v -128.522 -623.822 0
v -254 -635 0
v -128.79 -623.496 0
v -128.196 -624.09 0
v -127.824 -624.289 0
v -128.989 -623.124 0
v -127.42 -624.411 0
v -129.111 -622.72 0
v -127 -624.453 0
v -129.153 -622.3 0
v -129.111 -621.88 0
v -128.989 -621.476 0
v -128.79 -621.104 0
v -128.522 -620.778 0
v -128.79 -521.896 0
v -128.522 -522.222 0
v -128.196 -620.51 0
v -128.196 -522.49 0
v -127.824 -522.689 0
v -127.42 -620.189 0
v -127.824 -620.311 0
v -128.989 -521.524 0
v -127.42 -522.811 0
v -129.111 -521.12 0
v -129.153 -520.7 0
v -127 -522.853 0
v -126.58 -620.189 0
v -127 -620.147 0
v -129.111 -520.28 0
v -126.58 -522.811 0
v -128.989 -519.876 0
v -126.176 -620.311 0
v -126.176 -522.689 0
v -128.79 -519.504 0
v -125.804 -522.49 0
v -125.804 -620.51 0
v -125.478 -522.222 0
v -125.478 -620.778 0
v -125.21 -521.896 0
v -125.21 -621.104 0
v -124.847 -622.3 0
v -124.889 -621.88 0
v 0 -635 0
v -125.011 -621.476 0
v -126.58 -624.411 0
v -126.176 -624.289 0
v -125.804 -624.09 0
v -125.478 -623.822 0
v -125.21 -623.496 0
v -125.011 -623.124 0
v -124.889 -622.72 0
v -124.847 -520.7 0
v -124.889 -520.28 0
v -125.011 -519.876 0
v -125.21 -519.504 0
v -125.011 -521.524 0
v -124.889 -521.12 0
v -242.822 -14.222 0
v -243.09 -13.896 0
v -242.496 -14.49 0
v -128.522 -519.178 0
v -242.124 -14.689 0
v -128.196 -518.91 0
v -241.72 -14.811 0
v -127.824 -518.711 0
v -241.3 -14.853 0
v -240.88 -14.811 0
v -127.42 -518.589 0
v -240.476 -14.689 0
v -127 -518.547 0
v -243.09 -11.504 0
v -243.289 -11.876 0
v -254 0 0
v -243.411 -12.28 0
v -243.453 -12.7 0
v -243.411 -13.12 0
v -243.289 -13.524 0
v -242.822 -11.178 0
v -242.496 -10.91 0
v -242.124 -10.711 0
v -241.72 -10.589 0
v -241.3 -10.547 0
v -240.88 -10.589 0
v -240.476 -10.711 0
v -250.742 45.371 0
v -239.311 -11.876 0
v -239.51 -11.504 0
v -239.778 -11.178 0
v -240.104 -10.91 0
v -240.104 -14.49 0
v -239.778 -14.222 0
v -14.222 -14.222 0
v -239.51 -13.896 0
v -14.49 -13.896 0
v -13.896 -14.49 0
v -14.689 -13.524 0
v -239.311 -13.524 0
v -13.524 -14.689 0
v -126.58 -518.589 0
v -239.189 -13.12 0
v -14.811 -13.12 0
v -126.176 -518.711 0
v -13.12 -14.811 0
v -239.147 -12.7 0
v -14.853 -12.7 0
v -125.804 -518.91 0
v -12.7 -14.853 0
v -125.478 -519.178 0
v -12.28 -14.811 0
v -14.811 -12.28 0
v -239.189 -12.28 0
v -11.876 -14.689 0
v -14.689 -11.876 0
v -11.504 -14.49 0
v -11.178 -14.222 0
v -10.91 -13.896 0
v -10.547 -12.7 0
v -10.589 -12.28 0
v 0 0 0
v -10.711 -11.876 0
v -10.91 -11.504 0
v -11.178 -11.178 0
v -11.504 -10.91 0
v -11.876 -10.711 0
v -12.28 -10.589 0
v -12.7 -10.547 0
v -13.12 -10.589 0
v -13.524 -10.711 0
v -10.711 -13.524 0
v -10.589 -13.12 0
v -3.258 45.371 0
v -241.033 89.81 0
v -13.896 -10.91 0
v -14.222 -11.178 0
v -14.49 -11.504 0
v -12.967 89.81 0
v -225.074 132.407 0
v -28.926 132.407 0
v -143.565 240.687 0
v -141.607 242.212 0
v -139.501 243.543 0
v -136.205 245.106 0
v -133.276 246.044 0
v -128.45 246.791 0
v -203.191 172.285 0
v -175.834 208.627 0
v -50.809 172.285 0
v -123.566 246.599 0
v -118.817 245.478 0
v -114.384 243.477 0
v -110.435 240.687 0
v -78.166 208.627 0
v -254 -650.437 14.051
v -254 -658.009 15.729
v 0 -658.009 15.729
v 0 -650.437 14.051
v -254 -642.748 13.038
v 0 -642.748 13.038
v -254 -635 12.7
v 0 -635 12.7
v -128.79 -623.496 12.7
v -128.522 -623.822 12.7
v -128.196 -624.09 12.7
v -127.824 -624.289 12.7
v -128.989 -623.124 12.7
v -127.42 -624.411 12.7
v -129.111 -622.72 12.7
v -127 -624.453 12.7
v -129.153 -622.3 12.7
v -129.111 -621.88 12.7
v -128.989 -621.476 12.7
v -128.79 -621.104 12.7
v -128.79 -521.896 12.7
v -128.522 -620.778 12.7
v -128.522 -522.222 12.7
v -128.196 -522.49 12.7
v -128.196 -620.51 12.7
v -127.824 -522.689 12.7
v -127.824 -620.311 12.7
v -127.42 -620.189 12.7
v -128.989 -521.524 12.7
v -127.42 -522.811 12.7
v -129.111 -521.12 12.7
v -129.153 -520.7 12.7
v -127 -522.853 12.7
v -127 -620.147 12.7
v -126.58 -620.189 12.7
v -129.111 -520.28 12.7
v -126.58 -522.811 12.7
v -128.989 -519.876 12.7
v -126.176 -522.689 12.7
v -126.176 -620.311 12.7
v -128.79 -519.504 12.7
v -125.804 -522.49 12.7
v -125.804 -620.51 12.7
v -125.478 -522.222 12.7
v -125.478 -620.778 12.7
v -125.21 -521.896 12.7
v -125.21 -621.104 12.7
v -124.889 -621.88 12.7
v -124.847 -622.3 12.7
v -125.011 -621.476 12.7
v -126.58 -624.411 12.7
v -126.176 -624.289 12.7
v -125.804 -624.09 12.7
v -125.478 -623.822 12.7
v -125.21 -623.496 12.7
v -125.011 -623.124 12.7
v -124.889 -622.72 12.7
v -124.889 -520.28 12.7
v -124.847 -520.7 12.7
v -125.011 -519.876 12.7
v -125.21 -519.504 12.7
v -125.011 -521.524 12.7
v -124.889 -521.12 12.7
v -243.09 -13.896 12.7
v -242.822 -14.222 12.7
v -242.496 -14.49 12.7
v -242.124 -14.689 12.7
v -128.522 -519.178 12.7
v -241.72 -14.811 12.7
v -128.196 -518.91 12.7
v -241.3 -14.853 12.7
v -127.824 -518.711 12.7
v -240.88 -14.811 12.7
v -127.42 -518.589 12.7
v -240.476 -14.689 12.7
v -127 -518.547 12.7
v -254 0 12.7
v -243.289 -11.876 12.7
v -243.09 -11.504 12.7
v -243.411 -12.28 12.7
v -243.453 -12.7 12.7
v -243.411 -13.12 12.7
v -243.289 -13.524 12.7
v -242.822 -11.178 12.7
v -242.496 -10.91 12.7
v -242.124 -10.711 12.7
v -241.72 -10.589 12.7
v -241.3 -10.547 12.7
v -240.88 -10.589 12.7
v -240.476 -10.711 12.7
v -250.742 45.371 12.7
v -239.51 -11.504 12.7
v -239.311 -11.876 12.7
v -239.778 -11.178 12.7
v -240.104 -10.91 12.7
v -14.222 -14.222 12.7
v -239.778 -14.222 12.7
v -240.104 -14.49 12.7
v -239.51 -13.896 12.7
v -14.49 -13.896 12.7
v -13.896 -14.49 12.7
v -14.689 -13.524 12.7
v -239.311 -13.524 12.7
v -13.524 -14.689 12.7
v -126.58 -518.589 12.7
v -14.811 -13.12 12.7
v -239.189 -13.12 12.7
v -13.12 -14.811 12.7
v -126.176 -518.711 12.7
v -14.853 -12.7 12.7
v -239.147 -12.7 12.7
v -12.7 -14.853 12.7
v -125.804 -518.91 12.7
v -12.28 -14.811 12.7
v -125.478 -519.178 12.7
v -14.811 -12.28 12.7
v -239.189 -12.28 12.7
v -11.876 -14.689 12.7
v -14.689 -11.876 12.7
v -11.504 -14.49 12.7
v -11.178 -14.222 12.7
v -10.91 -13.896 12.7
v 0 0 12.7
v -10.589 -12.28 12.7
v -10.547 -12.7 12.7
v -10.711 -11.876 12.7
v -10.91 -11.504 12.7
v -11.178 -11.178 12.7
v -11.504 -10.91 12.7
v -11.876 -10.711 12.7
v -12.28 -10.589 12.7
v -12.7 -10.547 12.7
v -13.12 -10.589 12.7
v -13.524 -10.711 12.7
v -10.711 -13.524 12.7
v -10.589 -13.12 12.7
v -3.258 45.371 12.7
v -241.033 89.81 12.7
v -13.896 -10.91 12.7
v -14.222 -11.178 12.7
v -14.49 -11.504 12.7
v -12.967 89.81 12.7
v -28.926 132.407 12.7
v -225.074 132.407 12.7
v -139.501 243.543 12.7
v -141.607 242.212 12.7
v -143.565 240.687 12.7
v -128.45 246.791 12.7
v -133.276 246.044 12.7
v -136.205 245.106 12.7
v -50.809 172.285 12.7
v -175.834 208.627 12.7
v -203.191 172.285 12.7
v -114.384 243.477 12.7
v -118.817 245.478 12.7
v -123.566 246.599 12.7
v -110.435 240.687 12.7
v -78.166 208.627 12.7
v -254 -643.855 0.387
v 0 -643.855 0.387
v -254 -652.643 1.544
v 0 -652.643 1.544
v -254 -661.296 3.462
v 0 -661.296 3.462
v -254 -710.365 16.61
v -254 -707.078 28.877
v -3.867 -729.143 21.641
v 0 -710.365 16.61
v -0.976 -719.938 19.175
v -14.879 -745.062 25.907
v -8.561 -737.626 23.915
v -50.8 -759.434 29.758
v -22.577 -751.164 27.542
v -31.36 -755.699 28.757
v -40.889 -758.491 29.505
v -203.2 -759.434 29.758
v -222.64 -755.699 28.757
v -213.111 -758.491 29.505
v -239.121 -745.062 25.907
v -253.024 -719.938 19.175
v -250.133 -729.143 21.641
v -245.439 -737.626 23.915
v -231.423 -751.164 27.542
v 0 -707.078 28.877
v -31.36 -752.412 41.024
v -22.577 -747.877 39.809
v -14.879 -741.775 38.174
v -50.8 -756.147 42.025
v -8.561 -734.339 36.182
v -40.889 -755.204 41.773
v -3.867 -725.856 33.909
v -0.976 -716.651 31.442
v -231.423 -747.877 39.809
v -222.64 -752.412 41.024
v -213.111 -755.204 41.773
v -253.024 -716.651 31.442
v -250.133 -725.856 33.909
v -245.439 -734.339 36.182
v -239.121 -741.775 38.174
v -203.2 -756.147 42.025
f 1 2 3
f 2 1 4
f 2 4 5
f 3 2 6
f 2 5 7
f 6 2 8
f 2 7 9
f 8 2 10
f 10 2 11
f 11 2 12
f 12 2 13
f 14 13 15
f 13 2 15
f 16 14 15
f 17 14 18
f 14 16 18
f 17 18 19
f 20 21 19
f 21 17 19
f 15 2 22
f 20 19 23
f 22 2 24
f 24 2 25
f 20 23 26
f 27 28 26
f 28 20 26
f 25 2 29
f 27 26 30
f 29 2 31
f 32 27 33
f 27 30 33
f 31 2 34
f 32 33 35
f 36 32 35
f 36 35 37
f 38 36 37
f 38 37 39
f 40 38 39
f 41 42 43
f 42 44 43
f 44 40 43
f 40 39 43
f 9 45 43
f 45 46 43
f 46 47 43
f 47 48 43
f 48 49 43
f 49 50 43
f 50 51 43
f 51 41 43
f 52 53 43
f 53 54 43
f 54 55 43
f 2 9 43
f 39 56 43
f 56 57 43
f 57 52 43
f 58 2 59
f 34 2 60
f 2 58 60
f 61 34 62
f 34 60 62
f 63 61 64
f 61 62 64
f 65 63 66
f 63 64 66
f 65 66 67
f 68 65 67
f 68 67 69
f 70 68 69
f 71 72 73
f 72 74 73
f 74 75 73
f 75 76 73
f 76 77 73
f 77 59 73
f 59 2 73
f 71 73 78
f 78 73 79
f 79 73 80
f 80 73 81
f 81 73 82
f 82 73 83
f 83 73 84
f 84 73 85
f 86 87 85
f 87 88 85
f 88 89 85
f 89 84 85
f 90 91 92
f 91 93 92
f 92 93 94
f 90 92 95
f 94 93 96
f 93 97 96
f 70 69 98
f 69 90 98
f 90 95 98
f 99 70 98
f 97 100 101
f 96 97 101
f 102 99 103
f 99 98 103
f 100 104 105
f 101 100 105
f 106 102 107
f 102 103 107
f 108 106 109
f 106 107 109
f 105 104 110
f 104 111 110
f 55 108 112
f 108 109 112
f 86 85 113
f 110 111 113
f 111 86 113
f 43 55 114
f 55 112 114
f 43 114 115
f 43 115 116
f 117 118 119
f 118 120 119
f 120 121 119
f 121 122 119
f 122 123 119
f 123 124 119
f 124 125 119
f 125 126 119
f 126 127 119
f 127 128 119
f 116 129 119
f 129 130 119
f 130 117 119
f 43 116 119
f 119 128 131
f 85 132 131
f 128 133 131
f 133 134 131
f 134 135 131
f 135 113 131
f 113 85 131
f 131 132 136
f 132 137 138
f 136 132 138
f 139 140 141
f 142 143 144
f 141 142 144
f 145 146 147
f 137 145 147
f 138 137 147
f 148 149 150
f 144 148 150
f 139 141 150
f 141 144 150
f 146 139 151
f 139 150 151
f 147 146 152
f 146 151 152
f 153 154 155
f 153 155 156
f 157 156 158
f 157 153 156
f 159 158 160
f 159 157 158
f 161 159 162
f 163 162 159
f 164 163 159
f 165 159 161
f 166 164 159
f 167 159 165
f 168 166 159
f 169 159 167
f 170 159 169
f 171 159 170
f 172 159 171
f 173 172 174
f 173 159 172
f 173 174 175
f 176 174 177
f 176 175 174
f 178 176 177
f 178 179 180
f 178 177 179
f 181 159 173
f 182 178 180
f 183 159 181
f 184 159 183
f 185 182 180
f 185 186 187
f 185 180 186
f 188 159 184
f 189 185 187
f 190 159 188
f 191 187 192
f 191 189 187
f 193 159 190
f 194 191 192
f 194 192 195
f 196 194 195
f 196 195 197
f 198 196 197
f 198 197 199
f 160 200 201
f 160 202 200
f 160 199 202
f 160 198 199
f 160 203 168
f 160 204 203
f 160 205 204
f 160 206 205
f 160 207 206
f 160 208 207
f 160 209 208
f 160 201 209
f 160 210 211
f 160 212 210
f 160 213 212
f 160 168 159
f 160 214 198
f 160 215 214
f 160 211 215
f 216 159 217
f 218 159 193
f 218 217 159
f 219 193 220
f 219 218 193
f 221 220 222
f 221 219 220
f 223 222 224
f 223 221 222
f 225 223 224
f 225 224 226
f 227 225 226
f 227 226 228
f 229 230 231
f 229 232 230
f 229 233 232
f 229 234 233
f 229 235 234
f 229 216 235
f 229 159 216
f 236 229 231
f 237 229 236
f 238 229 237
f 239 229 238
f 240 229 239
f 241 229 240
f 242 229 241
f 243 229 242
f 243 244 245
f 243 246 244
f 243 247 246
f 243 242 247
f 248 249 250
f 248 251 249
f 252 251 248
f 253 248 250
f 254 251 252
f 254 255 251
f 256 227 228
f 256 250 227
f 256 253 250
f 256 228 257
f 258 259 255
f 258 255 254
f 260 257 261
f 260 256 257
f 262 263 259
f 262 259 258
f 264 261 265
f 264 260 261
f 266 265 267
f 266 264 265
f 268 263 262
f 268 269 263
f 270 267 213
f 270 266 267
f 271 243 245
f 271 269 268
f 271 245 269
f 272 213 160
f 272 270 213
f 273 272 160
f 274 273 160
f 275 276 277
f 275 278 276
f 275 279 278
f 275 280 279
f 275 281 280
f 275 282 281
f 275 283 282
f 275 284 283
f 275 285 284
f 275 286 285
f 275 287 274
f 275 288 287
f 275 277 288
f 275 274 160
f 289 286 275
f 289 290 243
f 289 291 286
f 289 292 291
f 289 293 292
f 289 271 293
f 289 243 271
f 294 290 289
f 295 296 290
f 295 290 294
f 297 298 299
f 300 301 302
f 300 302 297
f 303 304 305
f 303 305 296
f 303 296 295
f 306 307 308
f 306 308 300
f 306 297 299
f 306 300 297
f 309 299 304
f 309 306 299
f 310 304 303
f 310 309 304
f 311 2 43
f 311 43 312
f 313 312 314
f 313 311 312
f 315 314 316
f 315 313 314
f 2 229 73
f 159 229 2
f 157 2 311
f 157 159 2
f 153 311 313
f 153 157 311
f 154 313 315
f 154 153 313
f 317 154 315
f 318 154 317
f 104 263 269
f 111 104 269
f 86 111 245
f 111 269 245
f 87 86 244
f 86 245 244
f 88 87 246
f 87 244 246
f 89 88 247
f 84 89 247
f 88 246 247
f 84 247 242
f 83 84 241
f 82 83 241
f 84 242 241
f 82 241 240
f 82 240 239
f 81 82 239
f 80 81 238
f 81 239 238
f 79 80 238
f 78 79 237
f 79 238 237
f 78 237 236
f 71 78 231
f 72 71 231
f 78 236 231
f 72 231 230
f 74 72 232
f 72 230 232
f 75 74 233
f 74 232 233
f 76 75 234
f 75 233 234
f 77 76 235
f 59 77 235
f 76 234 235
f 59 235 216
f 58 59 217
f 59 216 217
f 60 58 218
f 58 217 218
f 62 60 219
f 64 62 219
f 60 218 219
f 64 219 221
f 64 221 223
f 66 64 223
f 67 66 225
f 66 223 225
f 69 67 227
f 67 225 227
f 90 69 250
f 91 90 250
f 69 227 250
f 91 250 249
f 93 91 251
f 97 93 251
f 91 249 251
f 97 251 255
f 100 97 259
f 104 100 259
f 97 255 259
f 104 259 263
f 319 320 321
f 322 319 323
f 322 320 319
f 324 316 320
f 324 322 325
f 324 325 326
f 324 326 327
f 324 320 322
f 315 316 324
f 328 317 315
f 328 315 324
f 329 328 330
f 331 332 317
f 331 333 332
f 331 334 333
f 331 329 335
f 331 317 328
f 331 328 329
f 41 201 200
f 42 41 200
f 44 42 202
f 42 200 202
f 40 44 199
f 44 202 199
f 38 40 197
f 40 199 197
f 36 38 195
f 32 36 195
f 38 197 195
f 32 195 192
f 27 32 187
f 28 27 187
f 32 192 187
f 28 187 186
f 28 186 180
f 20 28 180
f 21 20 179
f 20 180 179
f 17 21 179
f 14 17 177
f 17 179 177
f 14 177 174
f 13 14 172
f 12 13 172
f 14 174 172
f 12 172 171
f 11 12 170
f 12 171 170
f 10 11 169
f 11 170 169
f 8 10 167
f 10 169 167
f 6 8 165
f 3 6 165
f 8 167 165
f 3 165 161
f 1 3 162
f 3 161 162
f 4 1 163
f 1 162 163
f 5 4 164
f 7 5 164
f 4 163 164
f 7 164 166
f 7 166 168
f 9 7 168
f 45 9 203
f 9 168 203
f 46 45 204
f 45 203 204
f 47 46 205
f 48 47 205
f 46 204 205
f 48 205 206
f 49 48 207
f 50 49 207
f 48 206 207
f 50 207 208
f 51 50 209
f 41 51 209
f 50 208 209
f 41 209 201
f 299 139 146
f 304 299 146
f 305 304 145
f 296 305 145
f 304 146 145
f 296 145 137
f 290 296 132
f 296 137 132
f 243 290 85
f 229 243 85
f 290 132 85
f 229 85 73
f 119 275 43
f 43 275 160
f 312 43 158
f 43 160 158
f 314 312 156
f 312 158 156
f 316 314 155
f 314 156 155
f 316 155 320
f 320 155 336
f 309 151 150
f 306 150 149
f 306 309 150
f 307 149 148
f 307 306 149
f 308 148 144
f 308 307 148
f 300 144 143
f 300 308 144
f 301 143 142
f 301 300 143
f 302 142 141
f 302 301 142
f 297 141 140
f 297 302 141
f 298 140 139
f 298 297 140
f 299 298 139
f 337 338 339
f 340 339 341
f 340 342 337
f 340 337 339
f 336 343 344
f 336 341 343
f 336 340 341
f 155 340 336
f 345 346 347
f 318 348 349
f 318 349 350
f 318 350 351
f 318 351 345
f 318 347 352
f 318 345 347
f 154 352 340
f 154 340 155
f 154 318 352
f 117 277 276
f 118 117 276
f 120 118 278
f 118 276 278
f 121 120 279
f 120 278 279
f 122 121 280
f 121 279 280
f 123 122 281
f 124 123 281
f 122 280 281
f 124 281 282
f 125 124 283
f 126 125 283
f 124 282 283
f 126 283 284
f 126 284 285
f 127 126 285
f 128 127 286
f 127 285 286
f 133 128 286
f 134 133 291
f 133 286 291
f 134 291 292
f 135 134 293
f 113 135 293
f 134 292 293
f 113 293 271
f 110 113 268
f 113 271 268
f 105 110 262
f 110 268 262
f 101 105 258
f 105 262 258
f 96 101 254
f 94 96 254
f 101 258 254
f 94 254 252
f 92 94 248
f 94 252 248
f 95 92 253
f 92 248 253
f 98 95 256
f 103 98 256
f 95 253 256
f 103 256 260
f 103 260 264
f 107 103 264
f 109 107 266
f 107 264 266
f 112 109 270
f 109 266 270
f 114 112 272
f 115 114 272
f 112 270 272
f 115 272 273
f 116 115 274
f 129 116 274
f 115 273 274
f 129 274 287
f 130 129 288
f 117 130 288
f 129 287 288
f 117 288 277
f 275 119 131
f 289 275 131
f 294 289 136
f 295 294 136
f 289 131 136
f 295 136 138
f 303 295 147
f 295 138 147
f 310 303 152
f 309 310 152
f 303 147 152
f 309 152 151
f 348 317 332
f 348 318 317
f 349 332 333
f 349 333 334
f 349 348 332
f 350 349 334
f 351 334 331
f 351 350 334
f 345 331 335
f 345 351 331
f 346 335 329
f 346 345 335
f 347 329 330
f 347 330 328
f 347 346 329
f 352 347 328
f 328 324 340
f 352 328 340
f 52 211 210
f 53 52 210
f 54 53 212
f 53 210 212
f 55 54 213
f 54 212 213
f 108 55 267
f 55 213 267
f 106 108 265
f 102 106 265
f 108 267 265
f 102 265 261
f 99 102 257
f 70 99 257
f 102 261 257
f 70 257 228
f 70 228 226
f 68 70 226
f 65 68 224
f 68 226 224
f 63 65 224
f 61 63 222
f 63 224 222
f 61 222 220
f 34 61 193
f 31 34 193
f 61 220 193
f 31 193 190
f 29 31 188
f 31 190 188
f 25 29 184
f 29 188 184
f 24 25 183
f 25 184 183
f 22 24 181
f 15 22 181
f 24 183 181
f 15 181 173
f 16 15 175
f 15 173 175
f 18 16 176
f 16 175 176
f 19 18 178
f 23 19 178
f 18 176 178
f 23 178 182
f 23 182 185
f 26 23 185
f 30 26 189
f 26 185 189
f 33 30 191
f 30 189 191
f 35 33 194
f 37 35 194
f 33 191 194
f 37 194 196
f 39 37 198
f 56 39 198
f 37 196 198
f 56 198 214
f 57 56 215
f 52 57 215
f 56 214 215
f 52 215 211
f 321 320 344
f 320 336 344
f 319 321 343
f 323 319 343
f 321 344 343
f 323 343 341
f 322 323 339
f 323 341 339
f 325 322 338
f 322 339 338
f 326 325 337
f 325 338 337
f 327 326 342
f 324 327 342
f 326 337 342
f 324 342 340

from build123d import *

# Parameters (mm, degrees)
F1_DEPTH = 12.7
F2_R     = 25.4
F4_DEPTH = 254
F5_R     = 50.8
F6_R     = 2.15265
F7_DEPTH = 12.7


with BuildPart() as f1:
    # F0 (on Top) → F1 (new body)
    with BuildSketch(Plane.XY):
        with BuildLine():
            Line((-254, -635), (0, -635))
            Line((0, -635), (0, 0))
            ThreePointArc((0, 0), (-33.5193668575, 141.9903165712), (-127, 254))
            ThreePointArc((-127, 254), (-220.4806331425, 141.9903165712), (-254, 0))
            Line((-254, 0), (-254, -635))
        make_face()
    extrude(amount=F1_DEPTH)

    # F2
    f2_edges = [f1.edges().sort_by_distance(p)[0] for p in [
        (-127, 254, 6.35),
    ]]
    fillet(f2_edges, radius=F2_R)

    # F3 (on face) → F4 (join, through all)
    with BuildSketch(Plane(origin=(-254, 0, 0), x_dir=(0, -1, 0), z_dir=(-1, 0, 0))):
        with BuildLine():
            ThreePointArc((658.0090131096, 15.7291940429), (646.6037784884, 13.4605518239), (635, 12.7))
            Line((635, 12.7), (635, 0))
            ThreePointArc((635, 0), (648.2614611296, 0.8692020844), (661.2960149824, 3.461936049))
            Line((661.2960149824, 3.461936049), (759.4340789334, 29.7579510314))
            Line((759.4340789334, 29.7579510314), (756.1470770606, 42.0252090253))
            Line((756.1470770606, 42.0252090253), (658.0090131096, 15.7291940429))
        make_face()
    extrude(amount=-F4_DEPTH)

    # F5
    f5_edges = [f1.edges().sort_by_distance(p)[0] for p in [
        (0, -757.790578, 35.89158),
        (-254, -757.790578, 35.89158),
    ]]
    fillet(f5_edges, radius=F5_R)

    # F6 (on face) → F7 (cut, through all)
    with BuildSketch(Plane.XY.offset(12.7)):
        with Locations((-127, -520.7)):
            Circle(F6_R)
        with Locations((-127, -622.3)):
            Circle(F6_R)
        with Locations((-241.3, -12.7)):
            Circle(F6_R)
        with Locations((-12.7, -12.7)):
            Circle(F6_R)
    extrude(amount=-F7_DEPTH, mode=Mode.SUBTRACT)


solid = f1.part
